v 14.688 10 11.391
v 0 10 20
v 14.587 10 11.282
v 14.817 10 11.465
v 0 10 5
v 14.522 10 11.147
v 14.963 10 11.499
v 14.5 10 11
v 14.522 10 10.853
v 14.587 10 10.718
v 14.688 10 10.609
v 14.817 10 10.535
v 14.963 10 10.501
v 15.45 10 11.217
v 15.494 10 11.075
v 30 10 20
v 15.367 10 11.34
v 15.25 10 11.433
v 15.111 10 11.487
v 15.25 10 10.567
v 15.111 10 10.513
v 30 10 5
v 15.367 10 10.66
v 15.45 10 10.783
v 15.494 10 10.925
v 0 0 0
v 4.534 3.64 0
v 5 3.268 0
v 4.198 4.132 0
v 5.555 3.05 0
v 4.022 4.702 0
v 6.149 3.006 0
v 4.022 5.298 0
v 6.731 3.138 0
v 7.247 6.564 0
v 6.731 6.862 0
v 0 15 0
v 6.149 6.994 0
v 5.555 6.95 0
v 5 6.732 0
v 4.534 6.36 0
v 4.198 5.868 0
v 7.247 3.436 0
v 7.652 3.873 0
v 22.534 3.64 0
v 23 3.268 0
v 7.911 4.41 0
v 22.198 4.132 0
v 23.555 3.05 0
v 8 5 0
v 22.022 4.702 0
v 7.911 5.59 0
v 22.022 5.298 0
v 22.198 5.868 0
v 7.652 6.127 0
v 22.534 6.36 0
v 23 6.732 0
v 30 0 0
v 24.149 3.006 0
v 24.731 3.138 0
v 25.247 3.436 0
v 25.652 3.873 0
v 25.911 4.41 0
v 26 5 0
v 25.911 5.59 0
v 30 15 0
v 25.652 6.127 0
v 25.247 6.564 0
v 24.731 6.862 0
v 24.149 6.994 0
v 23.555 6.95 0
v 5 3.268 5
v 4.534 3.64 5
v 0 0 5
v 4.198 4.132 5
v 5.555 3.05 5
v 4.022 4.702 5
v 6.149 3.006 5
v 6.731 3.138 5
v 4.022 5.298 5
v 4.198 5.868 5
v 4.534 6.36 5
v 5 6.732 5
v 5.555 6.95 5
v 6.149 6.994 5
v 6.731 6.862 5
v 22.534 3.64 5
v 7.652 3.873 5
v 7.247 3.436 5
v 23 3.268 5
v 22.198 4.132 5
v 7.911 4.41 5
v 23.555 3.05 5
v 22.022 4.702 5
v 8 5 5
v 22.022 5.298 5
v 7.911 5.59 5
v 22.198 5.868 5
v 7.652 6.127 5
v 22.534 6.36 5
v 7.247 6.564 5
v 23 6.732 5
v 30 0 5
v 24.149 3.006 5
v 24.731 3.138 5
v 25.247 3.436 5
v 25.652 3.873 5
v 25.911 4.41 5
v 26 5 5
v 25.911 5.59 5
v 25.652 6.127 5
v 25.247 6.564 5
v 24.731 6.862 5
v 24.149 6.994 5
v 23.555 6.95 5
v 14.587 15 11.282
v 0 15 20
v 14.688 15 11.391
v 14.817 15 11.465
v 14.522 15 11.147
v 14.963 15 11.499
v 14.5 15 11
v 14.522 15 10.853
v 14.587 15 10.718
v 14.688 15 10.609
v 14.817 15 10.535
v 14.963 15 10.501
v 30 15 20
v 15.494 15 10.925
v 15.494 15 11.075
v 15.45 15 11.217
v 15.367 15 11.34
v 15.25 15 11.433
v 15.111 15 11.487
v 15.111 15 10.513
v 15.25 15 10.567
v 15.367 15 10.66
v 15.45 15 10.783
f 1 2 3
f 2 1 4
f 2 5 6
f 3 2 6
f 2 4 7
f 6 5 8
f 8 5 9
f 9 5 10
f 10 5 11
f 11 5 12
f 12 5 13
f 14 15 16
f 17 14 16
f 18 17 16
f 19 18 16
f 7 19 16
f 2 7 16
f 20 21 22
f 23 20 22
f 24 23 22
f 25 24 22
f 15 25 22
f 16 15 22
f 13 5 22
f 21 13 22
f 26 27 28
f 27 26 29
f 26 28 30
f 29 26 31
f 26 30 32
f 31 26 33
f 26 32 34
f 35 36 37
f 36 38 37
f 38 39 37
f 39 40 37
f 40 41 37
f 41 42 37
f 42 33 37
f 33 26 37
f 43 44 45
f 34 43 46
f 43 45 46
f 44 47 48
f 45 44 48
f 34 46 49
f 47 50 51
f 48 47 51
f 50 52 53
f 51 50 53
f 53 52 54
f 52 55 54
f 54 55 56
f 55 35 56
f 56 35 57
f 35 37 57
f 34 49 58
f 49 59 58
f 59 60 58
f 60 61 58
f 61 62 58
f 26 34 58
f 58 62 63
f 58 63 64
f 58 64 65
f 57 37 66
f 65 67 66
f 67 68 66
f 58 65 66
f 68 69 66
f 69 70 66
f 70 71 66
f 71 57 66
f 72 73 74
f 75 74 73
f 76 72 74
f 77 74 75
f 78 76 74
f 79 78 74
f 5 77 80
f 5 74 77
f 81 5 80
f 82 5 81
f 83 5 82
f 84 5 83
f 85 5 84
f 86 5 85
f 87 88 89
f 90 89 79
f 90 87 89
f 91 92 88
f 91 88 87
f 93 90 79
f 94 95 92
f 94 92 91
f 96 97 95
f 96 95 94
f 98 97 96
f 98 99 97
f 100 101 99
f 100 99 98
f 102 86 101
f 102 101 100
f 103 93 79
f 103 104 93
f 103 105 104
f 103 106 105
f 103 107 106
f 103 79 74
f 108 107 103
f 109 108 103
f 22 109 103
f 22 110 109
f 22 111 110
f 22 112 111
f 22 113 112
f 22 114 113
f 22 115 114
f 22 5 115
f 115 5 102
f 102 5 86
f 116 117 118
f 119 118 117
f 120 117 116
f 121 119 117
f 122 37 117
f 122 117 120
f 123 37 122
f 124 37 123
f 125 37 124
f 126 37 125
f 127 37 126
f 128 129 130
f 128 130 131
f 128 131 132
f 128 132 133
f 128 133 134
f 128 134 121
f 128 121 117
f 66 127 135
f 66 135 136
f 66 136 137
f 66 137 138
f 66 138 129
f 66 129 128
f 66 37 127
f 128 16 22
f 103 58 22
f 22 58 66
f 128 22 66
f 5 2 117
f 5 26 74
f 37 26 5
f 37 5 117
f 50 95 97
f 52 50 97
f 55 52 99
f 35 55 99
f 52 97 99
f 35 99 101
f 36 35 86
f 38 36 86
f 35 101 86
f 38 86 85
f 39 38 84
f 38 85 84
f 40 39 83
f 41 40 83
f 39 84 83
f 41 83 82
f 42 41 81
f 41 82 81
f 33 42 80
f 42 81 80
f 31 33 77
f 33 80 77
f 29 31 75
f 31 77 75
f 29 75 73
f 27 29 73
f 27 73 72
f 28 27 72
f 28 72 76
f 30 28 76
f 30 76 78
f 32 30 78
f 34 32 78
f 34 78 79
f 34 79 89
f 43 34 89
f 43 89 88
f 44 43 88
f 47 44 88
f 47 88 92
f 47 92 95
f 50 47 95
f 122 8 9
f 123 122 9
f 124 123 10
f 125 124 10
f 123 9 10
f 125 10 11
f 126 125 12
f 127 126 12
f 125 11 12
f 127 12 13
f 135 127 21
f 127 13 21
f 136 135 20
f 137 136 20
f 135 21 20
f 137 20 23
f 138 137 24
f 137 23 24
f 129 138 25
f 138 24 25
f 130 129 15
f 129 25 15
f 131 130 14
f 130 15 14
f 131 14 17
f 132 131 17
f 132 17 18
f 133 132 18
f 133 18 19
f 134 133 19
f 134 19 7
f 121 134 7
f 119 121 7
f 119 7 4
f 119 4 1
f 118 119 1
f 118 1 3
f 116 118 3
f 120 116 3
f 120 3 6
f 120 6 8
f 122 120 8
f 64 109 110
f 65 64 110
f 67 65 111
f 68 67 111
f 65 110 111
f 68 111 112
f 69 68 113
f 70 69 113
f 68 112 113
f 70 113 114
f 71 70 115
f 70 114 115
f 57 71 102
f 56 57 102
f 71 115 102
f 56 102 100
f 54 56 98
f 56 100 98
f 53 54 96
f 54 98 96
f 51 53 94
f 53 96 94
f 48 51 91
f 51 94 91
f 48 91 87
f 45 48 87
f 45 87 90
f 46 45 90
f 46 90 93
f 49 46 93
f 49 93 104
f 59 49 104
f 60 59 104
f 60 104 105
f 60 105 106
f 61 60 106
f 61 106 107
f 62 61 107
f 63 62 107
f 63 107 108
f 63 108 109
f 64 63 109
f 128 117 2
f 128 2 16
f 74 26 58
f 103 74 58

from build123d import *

# Parameters (mm, degrees)
CROQUIS1_W              = 30
CROQUIS1_H              = 15
SALIENTE_EXTRUIR1_DEPTH = 5
CROQUIS2_W              = 30
CROQUIS2_H              = 5
SALIENTE_EXTRUIR2_DEPTH = 15
CROQUIS3_R              = 2
CORTAR_EXTRUIR1_DEPTH   = 15
CROQUIS4_R              = 0.5
CORTAR_EXTRUIR2_DEPTH   = 10


with BuildPart() as part:
    # Croquis1 → Saliente-Extruir1 (new body)
    with BuildSketch(Plane.XY):
        with Locations((15, 7.5)):
            Rectangle(CROQUIS1_W, CROQUIS1_H)
    extrude(amount=SALIENTE_EXTRUIR1_DEPTH)

    # Croquis2 → Saliente-Extruir2 (add)
    with BuildSketch(Plane.XY.offset(5)):
        with Locations((15, 12.5)):
            Rectangle(CROQUIS2_W, CROQUIS2_H)
    extrude(amount=SALIENTE_EXTRUIR2_DEPTH)

    # Croquis3 → Cortar-Extruir1 (cut)
    with BuildSketch(Plane.XY.offset(5)):
        with Locations((24, 5)):
            Circle(CROQUIS3_R)
        with Locations((6, 5)):
            Circle(CROQUIS3_R)
    extrude(amount=-CORTAR_EXTRUIR1_DEPTH, mode=Mode.SUBTRACT)

    # Croquis4 → Cortar-Extruir2 (cut)
    with BuildSketch(Plane(origin=(0, 10, 0), x_dir=(-1, 0, 0), z_dir=(0, -1, 0))):
        with Locations((-15, -11)):
            Circle(CROQUIS4_R)
    extrude(amount=-CORTAR_EXTRUIR2_DEPTH, mode=Mode.SUBTRACT)


solid = part.part
